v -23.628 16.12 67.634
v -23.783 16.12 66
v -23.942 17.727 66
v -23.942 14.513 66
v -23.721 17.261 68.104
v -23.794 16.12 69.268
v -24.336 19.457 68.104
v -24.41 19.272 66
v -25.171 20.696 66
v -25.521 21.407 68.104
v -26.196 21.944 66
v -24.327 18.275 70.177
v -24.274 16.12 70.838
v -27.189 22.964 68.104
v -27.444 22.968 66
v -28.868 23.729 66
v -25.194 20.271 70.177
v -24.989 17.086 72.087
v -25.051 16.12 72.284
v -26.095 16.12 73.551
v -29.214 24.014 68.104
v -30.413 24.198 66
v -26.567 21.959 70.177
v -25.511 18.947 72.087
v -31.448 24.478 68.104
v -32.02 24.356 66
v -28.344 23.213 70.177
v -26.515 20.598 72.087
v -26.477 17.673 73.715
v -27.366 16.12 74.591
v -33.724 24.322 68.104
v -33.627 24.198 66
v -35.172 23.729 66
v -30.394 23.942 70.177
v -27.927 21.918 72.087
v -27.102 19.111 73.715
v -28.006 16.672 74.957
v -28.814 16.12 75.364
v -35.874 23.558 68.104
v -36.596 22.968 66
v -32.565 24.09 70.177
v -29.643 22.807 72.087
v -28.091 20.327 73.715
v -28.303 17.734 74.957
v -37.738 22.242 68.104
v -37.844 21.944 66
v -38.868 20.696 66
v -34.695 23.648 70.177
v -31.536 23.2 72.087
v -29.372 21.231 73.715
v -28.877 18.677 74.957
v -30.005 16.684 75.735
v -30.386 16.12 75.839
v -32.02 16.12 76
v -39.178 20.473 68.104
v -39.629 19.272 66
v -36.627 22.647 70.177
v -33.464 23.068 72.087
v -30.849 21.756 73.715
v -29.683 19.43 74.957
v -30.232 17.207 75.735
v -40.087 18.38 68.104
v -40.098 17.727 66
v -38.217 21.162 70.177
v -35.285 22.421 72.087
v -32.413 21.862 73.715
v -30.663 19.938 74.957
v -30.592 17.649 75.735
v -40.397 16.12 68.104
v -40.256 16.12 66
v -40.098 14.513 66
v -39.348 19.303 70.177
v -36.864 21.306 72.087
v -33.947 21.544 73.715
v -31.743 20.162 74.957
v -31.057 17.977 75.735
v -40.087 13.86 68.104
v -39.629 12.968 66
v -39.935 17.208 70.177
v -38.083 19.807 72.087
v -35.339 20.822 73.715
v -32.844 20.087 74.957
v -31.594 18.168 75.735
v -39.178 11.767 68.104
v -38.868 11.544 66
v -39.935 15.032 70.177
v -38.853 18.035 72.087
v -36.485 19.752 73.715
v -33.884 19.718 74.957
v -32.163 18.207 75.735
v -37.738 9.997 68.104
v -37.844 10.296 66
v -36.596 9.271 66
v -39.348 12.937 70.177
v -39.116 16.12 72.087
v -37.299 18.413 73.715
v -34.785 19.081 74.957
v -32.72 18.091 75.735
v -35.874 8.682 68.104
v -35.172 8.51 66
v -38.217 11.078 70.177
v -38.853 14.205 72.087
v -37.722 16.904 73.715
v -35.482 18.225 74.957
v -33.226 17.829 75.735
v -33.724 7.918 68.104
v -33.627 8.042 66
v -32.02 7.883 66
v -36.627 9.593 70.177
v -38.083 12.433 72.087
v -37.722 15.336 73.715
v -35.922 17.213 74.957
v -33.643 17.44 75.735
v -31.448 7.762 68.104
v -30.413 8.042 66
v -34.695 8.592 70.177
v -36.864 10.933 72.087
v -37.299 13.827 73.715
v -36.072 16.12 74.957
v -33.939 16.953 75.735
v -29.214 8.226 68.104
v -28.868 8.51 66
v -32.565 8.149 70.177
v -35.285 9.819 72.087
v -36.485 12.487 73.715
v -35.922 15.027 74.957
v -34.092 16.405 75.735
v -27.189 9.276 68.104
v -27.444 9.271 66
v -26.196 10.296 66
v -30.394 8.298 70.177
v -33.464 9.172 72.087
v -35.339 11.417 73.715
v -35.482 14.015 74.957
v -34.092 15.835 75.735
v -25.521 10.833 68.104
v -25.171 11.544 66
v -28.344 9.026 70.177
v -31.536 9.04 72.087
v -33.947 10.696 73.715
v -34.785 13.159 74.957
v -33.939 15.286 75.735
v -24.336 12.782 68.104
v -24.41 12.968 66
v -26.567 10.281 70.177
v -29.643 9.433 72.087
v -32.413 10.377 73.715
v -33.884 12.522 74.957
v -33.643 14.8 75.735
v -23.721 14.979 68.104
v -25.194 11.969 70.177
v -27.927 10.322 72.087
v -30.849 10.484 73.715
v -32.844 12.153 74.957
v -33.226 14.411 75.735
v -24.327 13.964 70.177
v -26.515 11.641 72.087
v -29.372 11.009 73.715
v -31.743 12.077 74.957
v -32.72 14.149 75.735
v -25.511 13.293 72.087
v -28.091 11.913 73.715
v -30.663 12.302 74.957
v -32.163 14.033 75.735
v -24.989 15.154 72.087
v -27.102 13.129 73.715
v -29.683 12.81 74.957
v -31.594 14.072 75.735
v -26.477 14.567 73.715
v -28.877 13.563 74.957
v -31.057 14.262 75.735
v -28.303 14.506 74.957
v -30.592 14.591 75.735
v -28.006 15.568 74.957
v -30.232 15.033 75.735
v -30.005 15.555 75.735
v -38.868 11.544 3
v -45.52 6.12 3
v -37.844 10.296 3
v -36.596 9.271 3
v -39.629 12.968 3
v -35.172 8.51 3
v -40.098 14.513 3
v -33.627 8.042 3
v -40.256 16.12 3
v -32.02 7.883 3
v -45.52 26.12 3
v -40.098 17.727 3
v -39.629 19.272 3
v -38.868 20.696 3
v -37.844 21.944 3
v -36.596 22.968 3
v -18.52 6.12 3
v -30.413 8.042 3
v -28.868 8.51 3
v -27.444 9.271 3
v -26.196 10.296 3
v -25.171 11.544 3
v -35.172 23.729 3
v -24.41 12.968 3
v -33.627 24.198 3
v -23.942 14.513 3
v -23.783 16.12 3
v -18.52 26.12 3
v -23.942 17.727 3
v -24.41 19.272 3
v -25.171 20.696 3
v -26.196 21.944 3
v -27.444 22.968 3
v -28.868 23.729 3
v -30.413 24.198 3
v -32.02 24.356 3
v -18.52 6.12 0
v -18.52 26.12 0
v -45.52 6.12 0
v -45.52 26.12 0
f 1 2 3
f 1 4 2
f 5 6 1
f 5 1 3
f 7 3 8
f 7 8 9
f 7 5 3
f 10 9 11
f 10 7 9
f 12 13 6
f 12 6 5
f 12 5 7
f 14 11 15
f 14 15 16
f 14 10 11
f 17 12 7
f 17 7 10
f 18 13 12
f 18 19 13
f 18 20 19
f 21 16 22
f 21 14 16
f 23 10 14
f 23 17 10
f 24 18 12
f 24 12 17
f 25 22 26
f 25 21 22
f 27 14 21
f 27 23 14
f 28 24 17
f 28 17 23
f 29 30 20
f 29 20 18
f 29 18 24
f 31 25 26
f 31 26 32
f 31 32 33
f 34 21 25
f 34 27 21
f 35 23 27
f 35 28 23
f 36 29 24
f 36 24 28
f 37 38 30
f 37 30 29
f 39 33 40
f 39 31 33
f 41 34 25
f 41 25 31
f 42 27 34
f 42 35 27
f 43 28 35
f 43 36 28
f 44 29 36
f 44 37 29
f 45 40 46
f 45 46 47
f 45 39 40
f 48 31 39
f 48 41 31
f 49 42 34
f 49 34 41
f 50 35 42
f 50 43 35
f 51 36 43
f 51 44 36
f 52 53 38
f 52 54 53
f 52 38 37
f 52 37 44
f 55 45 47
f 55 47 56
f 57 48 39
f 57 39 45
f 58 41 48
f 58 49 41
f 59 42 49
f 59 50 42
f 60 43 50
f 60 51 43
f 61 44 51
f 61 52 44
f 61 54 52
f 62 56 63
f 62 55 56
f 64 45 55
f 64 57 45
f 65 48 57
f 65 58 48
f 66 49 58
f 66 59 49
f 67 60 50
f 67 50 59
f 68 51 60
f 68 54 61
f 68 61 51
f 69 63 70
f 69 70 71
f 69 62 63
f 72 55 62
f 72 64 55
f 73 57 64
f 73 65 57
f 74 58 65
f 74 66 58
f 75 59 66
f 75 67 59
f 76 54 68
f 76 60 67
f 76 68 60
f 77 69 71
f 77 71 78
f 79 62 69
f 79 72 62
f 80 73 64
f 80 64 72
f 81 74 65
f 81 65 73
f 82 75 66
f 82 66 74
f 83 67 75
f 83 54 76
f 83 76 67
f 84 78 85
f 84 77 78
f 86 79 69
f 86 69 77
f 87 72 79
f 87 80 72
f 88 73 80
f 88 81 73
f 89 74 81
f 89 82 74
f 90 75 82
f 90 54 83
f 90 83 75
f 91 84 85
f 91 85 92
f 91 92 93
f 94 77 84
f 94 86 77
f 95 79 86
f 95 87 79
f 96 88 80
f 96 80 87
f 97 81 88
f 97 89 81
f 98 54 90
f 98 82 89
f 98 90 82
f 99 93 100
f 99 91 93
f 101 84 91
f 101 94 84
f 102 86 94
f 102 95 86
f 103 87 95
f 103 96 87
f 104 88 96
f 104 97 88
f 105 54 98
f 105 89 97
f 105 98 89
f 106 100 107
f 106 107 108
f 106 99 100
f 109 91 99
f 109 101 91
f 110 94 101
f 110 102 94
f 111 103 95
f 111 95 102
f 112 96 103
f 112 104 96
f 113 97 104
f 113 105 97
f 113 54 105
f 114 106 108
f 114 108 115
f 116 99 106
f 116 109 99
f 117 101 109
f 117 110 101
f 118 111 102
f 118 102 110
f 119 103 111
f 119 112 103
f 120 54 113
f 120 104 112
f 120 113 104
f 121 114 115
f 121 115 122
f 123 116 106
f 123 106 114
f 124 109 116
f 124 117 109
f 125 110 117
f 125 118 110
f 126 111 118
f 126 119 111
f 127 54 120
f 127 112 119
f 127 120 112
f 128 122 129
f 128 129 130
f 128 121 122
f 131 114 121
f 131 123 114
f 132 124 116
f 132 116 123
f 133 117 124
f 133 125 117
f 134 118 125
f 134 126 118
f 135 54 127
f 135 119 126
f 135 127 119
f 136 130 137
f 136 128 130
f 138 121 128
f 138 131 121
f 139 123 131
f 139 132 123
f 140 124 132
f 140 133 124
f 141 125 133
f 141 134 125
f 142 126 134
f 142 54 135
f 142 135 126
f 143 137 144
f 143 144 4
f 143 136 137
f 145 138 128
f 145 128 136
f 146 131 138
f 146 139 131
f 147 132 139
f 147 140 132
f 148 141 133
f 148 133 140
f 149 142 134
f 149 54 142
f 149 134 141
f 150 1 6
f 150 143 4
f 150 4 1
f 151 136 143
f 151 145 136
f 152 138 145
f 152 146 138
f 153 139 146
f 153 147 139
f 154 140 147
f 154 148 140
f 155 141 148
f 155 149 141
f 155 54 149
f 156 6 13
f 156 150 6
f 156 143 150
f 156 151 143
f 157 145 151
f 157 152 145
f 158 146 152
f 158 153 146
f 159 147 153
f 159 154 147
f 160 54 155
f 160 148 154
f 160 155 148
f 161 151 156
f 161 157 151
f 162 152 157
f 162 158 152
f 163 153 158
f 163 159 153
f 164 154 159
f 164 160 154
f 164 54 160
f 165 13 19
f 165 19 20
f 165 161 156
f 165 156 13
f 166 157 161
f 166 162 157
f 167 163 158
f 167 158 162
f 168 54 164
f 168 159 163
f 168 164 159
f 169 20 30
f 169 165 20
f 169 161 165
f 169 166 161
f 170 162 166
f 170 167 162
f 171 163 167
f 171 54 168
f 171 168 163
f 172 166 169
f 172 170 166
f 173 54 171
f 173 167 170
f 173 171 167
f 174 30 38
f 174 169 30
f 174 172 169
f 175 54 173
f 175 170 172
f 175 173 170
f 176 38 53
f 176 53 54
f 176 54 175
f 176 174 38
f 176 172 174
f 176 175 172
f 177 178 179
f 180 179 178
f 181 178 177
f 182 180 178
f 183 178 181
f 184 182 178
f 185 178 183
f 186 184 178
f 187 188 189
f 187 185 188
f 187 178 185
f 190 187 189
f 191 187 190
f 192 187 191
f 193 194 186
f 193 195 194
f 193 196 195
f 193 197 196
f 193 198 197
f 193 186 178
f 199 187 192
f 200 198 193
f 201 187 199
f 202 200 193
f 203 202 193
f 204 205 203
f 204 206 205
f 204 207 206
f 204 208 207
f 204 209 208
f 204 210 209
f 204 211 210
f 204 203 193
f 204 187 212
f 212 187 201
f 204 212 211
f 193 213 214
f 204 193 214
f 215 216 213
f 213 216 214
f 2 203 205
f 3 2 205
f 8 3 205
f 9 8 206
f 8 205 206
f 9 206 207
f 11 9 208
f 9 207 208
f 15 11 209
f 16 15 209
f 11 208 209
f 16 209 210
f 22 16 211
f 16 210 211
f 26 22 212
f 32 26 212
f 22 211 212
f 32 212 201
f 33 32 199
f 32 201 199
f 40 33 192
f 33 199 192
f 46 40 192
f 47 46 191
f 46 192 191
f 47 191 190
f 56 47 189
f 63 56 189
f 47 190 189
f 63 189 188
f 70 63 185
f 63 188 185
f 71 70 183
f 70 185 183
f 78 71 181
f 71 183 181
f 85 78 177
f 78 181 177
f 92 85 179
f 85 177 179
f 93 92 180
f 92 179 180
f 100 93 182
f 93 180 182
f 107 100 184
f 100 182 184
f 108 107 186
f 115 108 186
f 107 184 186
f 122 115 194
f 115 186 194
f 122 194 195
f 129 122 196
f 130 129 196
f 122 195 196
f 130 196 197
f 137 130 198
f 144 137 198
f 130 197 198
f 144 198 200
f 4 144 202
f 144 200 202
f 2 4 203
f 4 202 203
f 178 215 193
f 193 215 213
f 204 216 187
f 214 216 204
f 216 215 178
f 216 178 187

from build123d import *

# Parameters (mm, degrees)
ESQUISSE1_W        = 27
ESQUISSE1_H        = 20
BOSS_EXTRU_1_DEPTH = 3
ESQUISSE2_R        = 8.23653306
BOSS_EXTRU_2_DEPTH = 63
D_ME1_FACE_RADIUS  = 8.23653306
D_ME1_HEIGHT       = 10


with BuildPart() as part:
    # Esquisse1 → Boss.-Extru.1 (new body)
    with BuildSketch(Plane.XY):
        with Locations((-32.019829949, 16.119881557)):
            Rectangle(ESQUISSE1_W, ESQUISSE1_H)
    extrude(amount=BOSS_EXTRU_1_DEPTH)

    # Esquisse2 → Boss.-Extru.2 (add)
    with BuildSketch(Plane.XY.offset(3)):
        with Locations((-32.019829949, 16.119881557)):
            Circle(ESQUISSE2_R)
    extrude(amount=BOSS_EXTRU_2_DEPTH)

    # Dôme1: a dome of height H over a round flat face of radius A is a cap of a sphere of radius (A * A + H * H) / (2 * H)
    d_me1_r = (D_ME1_FACE_RADIUS * D_ME1_FACE_RADIUS + D_ME1_HEIGHT * D_ME1_HEIGHT) / (2 * D_ME1_HEIGHT)
    d_me1_base = Plane((-32.019829949, 16.119881557, 66), z_dir=(0, 0, 1))
    with Locations(d_me1_base.offset(D_ME1_HEIGHT - d_me1_r)):
        d_me1_ball = Sphere(d_me1_r, mode=Mode.PRIVATE)
    add(split(d_me1_ball, bisect_by=d_me1_base, keep=Keep.TOP, mode=Mode.PRIVATE))


solid = part.part
